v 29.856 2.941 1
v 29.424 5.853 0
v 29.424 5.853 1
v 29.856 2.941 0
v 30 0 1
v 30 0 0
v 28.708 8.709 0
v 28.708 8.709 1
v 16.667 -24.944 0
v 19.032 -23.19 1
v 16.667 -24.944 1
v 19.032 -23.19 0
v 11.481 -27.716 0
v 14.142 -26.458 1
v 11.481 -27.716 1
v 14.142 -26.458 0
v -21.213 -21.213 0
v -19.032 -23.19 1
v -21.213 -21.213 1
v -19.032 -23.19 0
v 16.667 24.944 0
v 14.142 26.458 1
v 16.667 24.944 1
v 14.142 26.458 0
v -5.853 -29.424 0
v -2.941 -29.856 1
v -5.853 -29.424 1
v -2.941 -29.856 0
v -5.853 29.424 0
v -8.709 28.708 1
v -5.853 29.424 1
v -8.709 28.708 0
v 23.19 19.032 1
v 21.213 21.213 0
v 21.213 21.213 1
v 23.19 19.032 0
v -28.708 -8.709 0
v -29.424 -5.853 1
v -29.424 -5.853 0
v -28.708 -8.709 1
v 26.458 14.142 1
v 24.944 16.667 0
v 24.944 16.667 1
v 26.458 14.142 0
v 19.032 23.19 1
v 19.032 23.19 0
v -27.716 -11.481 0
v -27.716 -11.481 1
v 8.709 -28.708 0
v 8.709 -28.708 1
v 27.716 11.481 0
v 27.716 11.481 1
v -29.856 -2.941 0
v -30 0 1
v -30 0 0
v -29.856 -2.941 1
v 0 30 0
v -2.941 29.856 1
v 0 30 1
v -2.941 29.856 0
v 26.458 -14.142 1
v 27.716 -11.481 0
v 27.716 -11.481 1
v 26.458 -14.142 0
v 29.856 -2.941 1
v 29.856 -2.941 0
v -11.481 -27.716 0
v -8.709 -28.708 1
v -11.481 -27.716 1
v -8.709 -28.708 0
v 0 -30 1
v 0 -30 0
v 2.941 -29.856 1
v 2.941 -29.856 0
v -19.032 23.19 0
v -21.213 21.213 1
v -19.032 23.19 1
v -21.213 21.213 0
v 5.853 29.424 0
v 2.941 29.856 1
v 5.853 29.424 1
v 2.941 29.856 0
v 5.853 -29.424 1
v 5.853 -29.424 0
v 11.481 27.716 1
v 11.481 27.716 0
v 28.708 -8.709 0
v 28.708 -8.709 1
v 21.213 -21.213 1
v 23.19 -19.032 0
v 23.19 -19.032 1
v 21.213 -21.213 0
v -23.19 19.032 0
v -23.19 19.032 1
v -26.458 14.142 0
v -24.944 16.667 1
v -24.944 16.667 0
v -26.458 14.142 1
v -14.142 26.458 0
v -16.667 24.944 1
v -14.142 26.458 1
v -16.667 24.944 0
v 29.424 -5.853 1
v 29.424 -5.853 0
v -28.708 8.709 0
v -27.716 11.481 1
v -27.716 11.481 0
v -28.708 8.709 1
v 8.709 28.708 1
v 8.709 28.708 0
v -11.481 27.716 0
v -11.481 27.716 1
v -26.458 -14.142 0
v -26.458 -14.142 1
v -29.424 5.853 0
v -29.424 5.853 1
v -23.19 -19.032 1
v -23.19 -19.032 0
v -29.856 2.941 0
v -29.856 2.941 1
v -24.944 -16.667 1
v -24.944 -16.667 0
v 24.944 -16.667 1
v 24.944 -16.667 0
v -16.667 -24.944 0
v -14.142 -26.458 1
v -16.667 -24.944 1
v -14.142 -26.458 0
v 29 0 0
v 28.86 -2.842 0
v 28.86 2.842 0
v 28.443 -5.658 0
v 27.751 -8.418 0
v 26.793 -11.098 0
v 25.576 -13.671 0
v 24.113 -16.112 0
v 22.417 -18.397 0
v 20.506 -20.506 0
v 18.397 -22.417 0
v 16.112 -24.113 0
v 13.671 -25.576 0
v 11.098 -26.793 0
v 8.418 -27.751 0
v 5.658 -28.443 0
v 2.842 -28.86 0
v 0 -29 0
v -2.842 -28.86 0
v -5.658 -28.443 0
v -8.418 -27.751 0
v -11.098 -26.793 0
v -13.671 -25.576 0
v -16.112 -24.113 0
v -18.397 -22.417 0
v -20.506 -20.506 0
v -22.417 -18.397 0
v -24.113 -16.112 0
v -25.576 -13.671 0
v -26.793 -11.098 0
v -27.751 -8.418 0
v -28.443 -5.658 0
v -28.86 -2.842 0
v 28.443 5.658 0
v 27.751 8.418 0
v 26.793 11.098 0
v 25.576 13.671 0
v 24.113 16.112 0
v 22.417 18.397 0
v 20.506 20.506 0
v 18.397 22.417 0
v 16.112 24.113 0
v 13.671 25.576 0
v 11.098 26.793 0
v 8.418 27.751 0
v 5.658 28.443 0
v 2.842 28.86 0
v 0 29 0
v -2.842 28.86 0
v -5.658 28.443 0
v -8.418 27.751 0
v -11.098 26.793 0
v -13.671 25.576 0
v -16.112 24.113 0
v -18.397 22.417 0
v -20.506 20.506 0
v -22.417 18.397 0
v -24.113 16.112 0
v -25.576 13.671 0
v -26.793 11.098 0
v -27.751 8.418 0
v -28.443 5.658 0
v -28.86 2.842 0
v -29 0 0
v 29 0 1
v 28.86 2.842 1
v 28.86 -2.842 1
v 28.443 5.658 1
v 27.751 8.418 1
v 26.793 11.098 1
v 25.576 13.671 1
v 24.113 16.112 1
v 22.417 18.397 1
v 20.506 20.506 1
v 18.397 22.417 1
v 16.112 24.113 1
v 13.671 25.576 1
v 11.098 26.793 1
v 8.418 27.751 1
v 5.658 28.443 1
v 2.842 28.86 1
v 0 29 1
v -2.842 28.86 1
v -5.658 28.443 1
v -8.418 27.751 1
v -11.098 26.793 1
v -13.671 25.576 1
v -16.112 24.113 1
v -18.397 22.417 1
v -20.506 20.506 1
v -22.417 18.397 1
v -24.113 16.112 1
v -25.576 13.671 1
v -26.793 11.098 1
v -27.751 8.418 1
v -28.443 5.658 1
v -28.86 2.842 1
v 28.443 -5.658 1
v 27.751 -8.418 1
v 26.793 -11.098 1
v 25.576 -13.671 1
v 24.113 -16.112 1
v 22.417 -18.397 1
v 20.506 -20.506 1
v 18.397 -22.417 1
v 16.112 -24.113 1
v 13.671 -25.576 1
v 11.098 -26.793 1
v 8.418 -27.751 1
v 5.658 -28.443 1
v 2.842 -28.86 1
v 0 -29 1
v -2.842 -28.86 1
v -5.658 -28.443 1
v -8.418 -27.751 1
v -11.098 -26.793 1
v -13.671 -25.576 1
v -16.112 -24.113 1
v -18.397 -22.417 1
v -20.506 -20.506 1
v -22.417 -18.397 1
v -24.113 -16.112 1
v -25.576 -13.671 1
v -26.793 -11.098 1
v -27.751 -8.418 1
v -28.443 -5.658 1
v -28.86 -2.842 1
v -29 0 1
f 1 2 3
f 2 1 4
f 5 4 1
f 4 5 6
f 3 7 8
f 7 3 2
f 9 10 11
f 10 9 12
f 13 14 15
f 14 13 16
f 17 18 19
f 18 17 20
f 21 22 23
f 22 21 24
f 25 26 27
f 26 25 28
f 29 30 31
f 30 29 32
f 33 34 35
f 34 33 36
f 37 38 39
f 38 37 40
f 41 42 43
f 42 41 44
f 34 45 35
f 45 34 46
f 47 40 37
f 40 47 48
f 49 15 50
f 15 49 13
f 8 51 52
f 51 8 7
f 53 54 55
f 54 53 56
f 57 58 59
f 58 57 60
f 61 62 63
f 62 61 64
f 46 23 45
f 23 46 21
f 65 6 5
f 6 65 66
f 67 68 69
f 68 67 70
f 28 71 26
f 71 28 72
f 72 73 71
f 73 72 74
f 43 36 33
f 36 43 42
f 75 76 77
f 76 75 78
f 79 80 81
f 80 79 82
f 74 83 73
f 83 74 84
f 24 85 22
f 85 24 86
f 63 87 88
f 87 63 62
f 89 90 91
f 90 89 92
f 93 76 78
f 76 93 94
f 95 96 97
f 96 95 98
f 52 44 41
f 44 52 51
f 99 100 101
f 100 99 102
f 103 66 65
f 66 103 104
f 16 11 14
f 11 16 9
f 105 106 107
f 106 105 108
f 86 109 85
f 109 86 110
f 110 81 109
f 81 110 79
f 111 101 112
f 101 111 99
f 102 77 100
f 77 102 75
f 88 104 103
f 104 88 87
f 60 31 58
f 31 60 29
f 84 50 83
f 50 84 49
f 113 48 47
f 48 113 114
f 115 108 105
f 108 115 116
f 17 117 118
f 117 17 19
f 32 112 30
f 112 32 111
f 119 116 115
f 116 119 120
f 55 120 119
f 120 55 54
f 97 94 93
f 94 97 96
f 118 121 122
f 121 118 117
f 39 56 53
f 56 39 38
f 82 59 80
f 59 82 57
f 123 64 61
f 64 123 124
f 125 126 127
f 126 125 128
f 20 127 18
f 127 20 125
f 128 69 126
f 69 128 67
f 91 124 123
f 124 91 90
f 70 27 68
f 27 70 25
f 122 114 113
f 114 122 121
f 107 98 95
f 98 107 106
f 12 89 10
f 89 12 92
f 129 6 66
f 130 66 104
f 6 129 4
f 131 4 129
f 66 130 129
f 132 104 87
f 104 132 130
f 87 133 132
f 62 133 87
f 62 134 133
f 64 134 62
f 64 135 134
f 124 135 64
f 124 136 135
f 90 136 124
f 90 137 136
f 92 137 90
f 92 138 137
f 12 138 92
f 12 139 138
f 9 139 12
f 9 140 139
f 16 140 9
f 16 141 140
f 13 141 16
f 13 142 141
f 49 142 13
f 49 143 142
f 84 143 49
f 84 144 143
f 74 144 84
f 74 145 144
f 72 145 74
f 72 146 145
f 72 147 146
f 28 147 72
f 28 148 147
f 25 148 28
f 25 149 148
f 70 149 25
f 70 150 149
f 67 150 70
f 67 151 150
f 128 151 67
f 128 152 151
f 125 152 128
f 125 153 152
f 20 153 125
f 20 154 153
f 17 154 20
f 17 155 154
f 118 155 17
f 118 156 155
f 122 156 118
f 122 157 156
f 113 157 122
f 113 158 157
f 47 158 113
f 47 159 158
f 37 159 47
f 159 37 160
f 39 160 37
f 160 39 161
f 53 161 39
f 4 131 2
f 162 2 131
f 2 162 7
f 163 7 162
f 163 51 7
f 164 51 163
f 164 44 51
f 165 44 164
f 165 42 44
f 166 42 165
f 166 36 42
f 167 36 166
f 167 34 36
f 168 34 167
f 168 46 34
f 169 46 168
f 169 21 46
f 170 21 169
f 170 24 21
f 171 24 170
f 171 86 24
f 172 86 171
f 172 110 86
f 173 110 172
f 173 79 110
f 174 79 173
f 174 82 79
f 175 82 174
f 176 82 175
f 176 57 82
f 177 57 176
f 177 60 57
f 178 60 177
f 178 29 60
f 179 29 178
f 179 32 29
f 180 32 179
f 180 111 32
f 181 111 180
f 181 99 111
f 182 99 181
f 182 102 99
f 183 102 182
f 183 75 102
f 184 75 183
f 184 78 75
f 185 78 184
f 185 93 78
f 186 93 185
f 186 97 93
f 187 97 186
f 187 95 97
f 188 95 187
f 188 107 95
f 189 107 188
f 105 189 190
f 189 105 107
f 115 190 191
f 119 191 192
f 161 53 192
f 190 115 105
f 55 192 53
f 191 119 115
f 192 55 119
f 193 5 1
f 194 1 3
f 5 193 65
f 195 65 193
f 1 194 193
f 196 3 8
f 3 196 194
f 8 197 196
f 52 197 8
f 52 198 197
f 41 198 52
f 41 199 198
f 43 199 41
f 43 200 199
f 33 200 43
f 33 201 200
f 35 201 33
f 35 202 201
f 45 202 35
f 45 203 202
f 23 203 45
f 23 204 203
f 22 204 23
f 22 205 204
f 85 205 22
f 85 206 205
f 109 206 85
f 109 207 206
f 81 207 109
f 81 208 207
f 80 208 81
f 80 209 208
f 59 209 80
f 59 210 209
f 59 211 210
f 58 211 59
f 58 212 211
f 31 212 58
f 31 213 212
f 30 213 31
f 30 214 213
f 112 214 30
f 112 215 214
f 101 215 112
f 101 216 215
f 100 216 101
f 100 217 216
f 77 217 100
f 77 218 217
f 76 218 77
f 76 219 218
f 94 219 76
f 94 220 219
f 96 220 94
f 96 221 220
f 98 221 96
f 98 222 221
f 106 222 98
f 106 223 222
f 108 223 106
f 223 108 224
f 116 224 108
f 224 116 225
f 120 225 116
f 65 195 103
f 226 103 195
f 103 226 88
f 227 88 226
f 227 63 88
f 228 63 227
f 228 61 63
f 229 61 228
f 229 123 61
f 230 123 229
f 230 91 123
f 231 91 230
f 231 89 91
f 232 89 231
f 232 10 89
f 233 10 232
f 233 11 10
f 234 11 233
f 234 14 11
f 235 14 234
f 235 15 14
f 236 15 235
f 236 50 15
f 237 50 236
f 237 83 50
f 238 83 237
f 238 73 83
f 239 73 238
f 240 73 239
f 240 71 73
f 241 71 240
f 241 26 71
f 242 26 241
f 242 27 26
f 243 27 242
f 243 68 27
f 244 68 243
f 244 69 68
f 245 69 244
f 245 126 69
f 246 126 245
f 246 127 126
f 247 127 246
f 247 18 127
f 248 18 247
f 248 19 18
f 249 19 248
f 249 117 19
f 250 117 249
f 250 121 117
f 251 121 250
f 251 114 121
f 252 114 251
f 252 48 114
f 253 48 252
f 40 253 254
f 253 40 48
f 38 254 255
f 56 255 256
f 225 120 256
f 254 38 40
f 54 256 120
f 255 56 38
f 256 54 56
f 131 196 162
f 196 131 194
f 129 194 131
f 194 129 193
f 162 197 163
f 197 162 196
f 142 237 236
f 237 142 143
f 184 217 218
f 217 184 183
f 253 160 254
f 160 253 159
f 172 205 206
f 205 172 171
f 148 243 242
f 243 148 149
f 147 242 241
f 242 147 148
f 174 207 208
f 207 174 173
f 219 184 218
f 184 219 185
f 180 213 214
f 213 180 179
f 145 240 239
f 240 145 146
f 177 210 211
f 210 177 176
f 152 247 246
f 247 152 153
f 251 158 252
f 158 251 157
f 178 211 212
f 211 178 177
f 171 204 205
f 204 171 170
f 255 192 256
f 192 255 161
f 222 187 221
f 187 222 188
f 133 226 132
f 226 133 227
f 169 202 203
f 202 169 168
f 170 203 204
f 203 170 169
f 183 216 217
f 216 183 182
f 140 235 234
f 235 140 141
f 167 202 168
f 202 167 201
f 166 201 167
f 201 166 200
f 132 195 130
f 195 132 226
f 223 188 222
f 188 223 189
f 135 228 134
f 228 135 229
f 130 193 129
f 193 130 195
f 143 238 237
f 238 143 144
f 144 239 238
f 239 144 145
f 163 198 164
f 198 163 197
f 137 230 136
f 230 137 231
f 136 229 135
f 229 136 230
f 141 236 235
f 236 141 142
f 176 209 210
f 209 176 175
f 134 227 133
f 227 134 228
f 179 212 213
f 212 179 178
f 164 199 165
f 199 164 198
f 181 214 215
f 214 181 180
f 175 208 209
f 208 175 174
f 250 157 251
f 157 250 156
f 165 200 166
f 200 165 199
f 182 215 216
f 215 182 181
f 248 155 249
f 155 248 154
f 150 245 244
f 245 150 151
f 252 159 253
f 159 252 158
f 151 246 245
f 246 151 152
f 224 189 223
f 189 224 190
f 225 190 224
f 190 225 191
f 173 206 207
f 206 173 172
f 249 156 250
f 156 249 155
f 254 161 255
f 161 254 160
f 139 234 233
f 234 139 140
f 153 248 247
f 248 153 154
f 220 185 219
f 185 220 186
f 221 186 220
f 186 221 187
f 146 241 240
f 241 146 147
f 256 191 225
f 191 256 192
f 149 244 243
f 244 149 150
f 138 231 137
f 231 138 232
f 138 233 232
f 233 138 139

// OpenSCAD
module ring(radius, thickness, height)
{
    difference()
    {
        cylinder(r=radius, h=height, $fn=64);
        translate([0,0,-thickness/2])cylinder(r=(radius-thickness), h=(height+thickness), $fn=64);
    }
}

ring(30, 1, 1);
